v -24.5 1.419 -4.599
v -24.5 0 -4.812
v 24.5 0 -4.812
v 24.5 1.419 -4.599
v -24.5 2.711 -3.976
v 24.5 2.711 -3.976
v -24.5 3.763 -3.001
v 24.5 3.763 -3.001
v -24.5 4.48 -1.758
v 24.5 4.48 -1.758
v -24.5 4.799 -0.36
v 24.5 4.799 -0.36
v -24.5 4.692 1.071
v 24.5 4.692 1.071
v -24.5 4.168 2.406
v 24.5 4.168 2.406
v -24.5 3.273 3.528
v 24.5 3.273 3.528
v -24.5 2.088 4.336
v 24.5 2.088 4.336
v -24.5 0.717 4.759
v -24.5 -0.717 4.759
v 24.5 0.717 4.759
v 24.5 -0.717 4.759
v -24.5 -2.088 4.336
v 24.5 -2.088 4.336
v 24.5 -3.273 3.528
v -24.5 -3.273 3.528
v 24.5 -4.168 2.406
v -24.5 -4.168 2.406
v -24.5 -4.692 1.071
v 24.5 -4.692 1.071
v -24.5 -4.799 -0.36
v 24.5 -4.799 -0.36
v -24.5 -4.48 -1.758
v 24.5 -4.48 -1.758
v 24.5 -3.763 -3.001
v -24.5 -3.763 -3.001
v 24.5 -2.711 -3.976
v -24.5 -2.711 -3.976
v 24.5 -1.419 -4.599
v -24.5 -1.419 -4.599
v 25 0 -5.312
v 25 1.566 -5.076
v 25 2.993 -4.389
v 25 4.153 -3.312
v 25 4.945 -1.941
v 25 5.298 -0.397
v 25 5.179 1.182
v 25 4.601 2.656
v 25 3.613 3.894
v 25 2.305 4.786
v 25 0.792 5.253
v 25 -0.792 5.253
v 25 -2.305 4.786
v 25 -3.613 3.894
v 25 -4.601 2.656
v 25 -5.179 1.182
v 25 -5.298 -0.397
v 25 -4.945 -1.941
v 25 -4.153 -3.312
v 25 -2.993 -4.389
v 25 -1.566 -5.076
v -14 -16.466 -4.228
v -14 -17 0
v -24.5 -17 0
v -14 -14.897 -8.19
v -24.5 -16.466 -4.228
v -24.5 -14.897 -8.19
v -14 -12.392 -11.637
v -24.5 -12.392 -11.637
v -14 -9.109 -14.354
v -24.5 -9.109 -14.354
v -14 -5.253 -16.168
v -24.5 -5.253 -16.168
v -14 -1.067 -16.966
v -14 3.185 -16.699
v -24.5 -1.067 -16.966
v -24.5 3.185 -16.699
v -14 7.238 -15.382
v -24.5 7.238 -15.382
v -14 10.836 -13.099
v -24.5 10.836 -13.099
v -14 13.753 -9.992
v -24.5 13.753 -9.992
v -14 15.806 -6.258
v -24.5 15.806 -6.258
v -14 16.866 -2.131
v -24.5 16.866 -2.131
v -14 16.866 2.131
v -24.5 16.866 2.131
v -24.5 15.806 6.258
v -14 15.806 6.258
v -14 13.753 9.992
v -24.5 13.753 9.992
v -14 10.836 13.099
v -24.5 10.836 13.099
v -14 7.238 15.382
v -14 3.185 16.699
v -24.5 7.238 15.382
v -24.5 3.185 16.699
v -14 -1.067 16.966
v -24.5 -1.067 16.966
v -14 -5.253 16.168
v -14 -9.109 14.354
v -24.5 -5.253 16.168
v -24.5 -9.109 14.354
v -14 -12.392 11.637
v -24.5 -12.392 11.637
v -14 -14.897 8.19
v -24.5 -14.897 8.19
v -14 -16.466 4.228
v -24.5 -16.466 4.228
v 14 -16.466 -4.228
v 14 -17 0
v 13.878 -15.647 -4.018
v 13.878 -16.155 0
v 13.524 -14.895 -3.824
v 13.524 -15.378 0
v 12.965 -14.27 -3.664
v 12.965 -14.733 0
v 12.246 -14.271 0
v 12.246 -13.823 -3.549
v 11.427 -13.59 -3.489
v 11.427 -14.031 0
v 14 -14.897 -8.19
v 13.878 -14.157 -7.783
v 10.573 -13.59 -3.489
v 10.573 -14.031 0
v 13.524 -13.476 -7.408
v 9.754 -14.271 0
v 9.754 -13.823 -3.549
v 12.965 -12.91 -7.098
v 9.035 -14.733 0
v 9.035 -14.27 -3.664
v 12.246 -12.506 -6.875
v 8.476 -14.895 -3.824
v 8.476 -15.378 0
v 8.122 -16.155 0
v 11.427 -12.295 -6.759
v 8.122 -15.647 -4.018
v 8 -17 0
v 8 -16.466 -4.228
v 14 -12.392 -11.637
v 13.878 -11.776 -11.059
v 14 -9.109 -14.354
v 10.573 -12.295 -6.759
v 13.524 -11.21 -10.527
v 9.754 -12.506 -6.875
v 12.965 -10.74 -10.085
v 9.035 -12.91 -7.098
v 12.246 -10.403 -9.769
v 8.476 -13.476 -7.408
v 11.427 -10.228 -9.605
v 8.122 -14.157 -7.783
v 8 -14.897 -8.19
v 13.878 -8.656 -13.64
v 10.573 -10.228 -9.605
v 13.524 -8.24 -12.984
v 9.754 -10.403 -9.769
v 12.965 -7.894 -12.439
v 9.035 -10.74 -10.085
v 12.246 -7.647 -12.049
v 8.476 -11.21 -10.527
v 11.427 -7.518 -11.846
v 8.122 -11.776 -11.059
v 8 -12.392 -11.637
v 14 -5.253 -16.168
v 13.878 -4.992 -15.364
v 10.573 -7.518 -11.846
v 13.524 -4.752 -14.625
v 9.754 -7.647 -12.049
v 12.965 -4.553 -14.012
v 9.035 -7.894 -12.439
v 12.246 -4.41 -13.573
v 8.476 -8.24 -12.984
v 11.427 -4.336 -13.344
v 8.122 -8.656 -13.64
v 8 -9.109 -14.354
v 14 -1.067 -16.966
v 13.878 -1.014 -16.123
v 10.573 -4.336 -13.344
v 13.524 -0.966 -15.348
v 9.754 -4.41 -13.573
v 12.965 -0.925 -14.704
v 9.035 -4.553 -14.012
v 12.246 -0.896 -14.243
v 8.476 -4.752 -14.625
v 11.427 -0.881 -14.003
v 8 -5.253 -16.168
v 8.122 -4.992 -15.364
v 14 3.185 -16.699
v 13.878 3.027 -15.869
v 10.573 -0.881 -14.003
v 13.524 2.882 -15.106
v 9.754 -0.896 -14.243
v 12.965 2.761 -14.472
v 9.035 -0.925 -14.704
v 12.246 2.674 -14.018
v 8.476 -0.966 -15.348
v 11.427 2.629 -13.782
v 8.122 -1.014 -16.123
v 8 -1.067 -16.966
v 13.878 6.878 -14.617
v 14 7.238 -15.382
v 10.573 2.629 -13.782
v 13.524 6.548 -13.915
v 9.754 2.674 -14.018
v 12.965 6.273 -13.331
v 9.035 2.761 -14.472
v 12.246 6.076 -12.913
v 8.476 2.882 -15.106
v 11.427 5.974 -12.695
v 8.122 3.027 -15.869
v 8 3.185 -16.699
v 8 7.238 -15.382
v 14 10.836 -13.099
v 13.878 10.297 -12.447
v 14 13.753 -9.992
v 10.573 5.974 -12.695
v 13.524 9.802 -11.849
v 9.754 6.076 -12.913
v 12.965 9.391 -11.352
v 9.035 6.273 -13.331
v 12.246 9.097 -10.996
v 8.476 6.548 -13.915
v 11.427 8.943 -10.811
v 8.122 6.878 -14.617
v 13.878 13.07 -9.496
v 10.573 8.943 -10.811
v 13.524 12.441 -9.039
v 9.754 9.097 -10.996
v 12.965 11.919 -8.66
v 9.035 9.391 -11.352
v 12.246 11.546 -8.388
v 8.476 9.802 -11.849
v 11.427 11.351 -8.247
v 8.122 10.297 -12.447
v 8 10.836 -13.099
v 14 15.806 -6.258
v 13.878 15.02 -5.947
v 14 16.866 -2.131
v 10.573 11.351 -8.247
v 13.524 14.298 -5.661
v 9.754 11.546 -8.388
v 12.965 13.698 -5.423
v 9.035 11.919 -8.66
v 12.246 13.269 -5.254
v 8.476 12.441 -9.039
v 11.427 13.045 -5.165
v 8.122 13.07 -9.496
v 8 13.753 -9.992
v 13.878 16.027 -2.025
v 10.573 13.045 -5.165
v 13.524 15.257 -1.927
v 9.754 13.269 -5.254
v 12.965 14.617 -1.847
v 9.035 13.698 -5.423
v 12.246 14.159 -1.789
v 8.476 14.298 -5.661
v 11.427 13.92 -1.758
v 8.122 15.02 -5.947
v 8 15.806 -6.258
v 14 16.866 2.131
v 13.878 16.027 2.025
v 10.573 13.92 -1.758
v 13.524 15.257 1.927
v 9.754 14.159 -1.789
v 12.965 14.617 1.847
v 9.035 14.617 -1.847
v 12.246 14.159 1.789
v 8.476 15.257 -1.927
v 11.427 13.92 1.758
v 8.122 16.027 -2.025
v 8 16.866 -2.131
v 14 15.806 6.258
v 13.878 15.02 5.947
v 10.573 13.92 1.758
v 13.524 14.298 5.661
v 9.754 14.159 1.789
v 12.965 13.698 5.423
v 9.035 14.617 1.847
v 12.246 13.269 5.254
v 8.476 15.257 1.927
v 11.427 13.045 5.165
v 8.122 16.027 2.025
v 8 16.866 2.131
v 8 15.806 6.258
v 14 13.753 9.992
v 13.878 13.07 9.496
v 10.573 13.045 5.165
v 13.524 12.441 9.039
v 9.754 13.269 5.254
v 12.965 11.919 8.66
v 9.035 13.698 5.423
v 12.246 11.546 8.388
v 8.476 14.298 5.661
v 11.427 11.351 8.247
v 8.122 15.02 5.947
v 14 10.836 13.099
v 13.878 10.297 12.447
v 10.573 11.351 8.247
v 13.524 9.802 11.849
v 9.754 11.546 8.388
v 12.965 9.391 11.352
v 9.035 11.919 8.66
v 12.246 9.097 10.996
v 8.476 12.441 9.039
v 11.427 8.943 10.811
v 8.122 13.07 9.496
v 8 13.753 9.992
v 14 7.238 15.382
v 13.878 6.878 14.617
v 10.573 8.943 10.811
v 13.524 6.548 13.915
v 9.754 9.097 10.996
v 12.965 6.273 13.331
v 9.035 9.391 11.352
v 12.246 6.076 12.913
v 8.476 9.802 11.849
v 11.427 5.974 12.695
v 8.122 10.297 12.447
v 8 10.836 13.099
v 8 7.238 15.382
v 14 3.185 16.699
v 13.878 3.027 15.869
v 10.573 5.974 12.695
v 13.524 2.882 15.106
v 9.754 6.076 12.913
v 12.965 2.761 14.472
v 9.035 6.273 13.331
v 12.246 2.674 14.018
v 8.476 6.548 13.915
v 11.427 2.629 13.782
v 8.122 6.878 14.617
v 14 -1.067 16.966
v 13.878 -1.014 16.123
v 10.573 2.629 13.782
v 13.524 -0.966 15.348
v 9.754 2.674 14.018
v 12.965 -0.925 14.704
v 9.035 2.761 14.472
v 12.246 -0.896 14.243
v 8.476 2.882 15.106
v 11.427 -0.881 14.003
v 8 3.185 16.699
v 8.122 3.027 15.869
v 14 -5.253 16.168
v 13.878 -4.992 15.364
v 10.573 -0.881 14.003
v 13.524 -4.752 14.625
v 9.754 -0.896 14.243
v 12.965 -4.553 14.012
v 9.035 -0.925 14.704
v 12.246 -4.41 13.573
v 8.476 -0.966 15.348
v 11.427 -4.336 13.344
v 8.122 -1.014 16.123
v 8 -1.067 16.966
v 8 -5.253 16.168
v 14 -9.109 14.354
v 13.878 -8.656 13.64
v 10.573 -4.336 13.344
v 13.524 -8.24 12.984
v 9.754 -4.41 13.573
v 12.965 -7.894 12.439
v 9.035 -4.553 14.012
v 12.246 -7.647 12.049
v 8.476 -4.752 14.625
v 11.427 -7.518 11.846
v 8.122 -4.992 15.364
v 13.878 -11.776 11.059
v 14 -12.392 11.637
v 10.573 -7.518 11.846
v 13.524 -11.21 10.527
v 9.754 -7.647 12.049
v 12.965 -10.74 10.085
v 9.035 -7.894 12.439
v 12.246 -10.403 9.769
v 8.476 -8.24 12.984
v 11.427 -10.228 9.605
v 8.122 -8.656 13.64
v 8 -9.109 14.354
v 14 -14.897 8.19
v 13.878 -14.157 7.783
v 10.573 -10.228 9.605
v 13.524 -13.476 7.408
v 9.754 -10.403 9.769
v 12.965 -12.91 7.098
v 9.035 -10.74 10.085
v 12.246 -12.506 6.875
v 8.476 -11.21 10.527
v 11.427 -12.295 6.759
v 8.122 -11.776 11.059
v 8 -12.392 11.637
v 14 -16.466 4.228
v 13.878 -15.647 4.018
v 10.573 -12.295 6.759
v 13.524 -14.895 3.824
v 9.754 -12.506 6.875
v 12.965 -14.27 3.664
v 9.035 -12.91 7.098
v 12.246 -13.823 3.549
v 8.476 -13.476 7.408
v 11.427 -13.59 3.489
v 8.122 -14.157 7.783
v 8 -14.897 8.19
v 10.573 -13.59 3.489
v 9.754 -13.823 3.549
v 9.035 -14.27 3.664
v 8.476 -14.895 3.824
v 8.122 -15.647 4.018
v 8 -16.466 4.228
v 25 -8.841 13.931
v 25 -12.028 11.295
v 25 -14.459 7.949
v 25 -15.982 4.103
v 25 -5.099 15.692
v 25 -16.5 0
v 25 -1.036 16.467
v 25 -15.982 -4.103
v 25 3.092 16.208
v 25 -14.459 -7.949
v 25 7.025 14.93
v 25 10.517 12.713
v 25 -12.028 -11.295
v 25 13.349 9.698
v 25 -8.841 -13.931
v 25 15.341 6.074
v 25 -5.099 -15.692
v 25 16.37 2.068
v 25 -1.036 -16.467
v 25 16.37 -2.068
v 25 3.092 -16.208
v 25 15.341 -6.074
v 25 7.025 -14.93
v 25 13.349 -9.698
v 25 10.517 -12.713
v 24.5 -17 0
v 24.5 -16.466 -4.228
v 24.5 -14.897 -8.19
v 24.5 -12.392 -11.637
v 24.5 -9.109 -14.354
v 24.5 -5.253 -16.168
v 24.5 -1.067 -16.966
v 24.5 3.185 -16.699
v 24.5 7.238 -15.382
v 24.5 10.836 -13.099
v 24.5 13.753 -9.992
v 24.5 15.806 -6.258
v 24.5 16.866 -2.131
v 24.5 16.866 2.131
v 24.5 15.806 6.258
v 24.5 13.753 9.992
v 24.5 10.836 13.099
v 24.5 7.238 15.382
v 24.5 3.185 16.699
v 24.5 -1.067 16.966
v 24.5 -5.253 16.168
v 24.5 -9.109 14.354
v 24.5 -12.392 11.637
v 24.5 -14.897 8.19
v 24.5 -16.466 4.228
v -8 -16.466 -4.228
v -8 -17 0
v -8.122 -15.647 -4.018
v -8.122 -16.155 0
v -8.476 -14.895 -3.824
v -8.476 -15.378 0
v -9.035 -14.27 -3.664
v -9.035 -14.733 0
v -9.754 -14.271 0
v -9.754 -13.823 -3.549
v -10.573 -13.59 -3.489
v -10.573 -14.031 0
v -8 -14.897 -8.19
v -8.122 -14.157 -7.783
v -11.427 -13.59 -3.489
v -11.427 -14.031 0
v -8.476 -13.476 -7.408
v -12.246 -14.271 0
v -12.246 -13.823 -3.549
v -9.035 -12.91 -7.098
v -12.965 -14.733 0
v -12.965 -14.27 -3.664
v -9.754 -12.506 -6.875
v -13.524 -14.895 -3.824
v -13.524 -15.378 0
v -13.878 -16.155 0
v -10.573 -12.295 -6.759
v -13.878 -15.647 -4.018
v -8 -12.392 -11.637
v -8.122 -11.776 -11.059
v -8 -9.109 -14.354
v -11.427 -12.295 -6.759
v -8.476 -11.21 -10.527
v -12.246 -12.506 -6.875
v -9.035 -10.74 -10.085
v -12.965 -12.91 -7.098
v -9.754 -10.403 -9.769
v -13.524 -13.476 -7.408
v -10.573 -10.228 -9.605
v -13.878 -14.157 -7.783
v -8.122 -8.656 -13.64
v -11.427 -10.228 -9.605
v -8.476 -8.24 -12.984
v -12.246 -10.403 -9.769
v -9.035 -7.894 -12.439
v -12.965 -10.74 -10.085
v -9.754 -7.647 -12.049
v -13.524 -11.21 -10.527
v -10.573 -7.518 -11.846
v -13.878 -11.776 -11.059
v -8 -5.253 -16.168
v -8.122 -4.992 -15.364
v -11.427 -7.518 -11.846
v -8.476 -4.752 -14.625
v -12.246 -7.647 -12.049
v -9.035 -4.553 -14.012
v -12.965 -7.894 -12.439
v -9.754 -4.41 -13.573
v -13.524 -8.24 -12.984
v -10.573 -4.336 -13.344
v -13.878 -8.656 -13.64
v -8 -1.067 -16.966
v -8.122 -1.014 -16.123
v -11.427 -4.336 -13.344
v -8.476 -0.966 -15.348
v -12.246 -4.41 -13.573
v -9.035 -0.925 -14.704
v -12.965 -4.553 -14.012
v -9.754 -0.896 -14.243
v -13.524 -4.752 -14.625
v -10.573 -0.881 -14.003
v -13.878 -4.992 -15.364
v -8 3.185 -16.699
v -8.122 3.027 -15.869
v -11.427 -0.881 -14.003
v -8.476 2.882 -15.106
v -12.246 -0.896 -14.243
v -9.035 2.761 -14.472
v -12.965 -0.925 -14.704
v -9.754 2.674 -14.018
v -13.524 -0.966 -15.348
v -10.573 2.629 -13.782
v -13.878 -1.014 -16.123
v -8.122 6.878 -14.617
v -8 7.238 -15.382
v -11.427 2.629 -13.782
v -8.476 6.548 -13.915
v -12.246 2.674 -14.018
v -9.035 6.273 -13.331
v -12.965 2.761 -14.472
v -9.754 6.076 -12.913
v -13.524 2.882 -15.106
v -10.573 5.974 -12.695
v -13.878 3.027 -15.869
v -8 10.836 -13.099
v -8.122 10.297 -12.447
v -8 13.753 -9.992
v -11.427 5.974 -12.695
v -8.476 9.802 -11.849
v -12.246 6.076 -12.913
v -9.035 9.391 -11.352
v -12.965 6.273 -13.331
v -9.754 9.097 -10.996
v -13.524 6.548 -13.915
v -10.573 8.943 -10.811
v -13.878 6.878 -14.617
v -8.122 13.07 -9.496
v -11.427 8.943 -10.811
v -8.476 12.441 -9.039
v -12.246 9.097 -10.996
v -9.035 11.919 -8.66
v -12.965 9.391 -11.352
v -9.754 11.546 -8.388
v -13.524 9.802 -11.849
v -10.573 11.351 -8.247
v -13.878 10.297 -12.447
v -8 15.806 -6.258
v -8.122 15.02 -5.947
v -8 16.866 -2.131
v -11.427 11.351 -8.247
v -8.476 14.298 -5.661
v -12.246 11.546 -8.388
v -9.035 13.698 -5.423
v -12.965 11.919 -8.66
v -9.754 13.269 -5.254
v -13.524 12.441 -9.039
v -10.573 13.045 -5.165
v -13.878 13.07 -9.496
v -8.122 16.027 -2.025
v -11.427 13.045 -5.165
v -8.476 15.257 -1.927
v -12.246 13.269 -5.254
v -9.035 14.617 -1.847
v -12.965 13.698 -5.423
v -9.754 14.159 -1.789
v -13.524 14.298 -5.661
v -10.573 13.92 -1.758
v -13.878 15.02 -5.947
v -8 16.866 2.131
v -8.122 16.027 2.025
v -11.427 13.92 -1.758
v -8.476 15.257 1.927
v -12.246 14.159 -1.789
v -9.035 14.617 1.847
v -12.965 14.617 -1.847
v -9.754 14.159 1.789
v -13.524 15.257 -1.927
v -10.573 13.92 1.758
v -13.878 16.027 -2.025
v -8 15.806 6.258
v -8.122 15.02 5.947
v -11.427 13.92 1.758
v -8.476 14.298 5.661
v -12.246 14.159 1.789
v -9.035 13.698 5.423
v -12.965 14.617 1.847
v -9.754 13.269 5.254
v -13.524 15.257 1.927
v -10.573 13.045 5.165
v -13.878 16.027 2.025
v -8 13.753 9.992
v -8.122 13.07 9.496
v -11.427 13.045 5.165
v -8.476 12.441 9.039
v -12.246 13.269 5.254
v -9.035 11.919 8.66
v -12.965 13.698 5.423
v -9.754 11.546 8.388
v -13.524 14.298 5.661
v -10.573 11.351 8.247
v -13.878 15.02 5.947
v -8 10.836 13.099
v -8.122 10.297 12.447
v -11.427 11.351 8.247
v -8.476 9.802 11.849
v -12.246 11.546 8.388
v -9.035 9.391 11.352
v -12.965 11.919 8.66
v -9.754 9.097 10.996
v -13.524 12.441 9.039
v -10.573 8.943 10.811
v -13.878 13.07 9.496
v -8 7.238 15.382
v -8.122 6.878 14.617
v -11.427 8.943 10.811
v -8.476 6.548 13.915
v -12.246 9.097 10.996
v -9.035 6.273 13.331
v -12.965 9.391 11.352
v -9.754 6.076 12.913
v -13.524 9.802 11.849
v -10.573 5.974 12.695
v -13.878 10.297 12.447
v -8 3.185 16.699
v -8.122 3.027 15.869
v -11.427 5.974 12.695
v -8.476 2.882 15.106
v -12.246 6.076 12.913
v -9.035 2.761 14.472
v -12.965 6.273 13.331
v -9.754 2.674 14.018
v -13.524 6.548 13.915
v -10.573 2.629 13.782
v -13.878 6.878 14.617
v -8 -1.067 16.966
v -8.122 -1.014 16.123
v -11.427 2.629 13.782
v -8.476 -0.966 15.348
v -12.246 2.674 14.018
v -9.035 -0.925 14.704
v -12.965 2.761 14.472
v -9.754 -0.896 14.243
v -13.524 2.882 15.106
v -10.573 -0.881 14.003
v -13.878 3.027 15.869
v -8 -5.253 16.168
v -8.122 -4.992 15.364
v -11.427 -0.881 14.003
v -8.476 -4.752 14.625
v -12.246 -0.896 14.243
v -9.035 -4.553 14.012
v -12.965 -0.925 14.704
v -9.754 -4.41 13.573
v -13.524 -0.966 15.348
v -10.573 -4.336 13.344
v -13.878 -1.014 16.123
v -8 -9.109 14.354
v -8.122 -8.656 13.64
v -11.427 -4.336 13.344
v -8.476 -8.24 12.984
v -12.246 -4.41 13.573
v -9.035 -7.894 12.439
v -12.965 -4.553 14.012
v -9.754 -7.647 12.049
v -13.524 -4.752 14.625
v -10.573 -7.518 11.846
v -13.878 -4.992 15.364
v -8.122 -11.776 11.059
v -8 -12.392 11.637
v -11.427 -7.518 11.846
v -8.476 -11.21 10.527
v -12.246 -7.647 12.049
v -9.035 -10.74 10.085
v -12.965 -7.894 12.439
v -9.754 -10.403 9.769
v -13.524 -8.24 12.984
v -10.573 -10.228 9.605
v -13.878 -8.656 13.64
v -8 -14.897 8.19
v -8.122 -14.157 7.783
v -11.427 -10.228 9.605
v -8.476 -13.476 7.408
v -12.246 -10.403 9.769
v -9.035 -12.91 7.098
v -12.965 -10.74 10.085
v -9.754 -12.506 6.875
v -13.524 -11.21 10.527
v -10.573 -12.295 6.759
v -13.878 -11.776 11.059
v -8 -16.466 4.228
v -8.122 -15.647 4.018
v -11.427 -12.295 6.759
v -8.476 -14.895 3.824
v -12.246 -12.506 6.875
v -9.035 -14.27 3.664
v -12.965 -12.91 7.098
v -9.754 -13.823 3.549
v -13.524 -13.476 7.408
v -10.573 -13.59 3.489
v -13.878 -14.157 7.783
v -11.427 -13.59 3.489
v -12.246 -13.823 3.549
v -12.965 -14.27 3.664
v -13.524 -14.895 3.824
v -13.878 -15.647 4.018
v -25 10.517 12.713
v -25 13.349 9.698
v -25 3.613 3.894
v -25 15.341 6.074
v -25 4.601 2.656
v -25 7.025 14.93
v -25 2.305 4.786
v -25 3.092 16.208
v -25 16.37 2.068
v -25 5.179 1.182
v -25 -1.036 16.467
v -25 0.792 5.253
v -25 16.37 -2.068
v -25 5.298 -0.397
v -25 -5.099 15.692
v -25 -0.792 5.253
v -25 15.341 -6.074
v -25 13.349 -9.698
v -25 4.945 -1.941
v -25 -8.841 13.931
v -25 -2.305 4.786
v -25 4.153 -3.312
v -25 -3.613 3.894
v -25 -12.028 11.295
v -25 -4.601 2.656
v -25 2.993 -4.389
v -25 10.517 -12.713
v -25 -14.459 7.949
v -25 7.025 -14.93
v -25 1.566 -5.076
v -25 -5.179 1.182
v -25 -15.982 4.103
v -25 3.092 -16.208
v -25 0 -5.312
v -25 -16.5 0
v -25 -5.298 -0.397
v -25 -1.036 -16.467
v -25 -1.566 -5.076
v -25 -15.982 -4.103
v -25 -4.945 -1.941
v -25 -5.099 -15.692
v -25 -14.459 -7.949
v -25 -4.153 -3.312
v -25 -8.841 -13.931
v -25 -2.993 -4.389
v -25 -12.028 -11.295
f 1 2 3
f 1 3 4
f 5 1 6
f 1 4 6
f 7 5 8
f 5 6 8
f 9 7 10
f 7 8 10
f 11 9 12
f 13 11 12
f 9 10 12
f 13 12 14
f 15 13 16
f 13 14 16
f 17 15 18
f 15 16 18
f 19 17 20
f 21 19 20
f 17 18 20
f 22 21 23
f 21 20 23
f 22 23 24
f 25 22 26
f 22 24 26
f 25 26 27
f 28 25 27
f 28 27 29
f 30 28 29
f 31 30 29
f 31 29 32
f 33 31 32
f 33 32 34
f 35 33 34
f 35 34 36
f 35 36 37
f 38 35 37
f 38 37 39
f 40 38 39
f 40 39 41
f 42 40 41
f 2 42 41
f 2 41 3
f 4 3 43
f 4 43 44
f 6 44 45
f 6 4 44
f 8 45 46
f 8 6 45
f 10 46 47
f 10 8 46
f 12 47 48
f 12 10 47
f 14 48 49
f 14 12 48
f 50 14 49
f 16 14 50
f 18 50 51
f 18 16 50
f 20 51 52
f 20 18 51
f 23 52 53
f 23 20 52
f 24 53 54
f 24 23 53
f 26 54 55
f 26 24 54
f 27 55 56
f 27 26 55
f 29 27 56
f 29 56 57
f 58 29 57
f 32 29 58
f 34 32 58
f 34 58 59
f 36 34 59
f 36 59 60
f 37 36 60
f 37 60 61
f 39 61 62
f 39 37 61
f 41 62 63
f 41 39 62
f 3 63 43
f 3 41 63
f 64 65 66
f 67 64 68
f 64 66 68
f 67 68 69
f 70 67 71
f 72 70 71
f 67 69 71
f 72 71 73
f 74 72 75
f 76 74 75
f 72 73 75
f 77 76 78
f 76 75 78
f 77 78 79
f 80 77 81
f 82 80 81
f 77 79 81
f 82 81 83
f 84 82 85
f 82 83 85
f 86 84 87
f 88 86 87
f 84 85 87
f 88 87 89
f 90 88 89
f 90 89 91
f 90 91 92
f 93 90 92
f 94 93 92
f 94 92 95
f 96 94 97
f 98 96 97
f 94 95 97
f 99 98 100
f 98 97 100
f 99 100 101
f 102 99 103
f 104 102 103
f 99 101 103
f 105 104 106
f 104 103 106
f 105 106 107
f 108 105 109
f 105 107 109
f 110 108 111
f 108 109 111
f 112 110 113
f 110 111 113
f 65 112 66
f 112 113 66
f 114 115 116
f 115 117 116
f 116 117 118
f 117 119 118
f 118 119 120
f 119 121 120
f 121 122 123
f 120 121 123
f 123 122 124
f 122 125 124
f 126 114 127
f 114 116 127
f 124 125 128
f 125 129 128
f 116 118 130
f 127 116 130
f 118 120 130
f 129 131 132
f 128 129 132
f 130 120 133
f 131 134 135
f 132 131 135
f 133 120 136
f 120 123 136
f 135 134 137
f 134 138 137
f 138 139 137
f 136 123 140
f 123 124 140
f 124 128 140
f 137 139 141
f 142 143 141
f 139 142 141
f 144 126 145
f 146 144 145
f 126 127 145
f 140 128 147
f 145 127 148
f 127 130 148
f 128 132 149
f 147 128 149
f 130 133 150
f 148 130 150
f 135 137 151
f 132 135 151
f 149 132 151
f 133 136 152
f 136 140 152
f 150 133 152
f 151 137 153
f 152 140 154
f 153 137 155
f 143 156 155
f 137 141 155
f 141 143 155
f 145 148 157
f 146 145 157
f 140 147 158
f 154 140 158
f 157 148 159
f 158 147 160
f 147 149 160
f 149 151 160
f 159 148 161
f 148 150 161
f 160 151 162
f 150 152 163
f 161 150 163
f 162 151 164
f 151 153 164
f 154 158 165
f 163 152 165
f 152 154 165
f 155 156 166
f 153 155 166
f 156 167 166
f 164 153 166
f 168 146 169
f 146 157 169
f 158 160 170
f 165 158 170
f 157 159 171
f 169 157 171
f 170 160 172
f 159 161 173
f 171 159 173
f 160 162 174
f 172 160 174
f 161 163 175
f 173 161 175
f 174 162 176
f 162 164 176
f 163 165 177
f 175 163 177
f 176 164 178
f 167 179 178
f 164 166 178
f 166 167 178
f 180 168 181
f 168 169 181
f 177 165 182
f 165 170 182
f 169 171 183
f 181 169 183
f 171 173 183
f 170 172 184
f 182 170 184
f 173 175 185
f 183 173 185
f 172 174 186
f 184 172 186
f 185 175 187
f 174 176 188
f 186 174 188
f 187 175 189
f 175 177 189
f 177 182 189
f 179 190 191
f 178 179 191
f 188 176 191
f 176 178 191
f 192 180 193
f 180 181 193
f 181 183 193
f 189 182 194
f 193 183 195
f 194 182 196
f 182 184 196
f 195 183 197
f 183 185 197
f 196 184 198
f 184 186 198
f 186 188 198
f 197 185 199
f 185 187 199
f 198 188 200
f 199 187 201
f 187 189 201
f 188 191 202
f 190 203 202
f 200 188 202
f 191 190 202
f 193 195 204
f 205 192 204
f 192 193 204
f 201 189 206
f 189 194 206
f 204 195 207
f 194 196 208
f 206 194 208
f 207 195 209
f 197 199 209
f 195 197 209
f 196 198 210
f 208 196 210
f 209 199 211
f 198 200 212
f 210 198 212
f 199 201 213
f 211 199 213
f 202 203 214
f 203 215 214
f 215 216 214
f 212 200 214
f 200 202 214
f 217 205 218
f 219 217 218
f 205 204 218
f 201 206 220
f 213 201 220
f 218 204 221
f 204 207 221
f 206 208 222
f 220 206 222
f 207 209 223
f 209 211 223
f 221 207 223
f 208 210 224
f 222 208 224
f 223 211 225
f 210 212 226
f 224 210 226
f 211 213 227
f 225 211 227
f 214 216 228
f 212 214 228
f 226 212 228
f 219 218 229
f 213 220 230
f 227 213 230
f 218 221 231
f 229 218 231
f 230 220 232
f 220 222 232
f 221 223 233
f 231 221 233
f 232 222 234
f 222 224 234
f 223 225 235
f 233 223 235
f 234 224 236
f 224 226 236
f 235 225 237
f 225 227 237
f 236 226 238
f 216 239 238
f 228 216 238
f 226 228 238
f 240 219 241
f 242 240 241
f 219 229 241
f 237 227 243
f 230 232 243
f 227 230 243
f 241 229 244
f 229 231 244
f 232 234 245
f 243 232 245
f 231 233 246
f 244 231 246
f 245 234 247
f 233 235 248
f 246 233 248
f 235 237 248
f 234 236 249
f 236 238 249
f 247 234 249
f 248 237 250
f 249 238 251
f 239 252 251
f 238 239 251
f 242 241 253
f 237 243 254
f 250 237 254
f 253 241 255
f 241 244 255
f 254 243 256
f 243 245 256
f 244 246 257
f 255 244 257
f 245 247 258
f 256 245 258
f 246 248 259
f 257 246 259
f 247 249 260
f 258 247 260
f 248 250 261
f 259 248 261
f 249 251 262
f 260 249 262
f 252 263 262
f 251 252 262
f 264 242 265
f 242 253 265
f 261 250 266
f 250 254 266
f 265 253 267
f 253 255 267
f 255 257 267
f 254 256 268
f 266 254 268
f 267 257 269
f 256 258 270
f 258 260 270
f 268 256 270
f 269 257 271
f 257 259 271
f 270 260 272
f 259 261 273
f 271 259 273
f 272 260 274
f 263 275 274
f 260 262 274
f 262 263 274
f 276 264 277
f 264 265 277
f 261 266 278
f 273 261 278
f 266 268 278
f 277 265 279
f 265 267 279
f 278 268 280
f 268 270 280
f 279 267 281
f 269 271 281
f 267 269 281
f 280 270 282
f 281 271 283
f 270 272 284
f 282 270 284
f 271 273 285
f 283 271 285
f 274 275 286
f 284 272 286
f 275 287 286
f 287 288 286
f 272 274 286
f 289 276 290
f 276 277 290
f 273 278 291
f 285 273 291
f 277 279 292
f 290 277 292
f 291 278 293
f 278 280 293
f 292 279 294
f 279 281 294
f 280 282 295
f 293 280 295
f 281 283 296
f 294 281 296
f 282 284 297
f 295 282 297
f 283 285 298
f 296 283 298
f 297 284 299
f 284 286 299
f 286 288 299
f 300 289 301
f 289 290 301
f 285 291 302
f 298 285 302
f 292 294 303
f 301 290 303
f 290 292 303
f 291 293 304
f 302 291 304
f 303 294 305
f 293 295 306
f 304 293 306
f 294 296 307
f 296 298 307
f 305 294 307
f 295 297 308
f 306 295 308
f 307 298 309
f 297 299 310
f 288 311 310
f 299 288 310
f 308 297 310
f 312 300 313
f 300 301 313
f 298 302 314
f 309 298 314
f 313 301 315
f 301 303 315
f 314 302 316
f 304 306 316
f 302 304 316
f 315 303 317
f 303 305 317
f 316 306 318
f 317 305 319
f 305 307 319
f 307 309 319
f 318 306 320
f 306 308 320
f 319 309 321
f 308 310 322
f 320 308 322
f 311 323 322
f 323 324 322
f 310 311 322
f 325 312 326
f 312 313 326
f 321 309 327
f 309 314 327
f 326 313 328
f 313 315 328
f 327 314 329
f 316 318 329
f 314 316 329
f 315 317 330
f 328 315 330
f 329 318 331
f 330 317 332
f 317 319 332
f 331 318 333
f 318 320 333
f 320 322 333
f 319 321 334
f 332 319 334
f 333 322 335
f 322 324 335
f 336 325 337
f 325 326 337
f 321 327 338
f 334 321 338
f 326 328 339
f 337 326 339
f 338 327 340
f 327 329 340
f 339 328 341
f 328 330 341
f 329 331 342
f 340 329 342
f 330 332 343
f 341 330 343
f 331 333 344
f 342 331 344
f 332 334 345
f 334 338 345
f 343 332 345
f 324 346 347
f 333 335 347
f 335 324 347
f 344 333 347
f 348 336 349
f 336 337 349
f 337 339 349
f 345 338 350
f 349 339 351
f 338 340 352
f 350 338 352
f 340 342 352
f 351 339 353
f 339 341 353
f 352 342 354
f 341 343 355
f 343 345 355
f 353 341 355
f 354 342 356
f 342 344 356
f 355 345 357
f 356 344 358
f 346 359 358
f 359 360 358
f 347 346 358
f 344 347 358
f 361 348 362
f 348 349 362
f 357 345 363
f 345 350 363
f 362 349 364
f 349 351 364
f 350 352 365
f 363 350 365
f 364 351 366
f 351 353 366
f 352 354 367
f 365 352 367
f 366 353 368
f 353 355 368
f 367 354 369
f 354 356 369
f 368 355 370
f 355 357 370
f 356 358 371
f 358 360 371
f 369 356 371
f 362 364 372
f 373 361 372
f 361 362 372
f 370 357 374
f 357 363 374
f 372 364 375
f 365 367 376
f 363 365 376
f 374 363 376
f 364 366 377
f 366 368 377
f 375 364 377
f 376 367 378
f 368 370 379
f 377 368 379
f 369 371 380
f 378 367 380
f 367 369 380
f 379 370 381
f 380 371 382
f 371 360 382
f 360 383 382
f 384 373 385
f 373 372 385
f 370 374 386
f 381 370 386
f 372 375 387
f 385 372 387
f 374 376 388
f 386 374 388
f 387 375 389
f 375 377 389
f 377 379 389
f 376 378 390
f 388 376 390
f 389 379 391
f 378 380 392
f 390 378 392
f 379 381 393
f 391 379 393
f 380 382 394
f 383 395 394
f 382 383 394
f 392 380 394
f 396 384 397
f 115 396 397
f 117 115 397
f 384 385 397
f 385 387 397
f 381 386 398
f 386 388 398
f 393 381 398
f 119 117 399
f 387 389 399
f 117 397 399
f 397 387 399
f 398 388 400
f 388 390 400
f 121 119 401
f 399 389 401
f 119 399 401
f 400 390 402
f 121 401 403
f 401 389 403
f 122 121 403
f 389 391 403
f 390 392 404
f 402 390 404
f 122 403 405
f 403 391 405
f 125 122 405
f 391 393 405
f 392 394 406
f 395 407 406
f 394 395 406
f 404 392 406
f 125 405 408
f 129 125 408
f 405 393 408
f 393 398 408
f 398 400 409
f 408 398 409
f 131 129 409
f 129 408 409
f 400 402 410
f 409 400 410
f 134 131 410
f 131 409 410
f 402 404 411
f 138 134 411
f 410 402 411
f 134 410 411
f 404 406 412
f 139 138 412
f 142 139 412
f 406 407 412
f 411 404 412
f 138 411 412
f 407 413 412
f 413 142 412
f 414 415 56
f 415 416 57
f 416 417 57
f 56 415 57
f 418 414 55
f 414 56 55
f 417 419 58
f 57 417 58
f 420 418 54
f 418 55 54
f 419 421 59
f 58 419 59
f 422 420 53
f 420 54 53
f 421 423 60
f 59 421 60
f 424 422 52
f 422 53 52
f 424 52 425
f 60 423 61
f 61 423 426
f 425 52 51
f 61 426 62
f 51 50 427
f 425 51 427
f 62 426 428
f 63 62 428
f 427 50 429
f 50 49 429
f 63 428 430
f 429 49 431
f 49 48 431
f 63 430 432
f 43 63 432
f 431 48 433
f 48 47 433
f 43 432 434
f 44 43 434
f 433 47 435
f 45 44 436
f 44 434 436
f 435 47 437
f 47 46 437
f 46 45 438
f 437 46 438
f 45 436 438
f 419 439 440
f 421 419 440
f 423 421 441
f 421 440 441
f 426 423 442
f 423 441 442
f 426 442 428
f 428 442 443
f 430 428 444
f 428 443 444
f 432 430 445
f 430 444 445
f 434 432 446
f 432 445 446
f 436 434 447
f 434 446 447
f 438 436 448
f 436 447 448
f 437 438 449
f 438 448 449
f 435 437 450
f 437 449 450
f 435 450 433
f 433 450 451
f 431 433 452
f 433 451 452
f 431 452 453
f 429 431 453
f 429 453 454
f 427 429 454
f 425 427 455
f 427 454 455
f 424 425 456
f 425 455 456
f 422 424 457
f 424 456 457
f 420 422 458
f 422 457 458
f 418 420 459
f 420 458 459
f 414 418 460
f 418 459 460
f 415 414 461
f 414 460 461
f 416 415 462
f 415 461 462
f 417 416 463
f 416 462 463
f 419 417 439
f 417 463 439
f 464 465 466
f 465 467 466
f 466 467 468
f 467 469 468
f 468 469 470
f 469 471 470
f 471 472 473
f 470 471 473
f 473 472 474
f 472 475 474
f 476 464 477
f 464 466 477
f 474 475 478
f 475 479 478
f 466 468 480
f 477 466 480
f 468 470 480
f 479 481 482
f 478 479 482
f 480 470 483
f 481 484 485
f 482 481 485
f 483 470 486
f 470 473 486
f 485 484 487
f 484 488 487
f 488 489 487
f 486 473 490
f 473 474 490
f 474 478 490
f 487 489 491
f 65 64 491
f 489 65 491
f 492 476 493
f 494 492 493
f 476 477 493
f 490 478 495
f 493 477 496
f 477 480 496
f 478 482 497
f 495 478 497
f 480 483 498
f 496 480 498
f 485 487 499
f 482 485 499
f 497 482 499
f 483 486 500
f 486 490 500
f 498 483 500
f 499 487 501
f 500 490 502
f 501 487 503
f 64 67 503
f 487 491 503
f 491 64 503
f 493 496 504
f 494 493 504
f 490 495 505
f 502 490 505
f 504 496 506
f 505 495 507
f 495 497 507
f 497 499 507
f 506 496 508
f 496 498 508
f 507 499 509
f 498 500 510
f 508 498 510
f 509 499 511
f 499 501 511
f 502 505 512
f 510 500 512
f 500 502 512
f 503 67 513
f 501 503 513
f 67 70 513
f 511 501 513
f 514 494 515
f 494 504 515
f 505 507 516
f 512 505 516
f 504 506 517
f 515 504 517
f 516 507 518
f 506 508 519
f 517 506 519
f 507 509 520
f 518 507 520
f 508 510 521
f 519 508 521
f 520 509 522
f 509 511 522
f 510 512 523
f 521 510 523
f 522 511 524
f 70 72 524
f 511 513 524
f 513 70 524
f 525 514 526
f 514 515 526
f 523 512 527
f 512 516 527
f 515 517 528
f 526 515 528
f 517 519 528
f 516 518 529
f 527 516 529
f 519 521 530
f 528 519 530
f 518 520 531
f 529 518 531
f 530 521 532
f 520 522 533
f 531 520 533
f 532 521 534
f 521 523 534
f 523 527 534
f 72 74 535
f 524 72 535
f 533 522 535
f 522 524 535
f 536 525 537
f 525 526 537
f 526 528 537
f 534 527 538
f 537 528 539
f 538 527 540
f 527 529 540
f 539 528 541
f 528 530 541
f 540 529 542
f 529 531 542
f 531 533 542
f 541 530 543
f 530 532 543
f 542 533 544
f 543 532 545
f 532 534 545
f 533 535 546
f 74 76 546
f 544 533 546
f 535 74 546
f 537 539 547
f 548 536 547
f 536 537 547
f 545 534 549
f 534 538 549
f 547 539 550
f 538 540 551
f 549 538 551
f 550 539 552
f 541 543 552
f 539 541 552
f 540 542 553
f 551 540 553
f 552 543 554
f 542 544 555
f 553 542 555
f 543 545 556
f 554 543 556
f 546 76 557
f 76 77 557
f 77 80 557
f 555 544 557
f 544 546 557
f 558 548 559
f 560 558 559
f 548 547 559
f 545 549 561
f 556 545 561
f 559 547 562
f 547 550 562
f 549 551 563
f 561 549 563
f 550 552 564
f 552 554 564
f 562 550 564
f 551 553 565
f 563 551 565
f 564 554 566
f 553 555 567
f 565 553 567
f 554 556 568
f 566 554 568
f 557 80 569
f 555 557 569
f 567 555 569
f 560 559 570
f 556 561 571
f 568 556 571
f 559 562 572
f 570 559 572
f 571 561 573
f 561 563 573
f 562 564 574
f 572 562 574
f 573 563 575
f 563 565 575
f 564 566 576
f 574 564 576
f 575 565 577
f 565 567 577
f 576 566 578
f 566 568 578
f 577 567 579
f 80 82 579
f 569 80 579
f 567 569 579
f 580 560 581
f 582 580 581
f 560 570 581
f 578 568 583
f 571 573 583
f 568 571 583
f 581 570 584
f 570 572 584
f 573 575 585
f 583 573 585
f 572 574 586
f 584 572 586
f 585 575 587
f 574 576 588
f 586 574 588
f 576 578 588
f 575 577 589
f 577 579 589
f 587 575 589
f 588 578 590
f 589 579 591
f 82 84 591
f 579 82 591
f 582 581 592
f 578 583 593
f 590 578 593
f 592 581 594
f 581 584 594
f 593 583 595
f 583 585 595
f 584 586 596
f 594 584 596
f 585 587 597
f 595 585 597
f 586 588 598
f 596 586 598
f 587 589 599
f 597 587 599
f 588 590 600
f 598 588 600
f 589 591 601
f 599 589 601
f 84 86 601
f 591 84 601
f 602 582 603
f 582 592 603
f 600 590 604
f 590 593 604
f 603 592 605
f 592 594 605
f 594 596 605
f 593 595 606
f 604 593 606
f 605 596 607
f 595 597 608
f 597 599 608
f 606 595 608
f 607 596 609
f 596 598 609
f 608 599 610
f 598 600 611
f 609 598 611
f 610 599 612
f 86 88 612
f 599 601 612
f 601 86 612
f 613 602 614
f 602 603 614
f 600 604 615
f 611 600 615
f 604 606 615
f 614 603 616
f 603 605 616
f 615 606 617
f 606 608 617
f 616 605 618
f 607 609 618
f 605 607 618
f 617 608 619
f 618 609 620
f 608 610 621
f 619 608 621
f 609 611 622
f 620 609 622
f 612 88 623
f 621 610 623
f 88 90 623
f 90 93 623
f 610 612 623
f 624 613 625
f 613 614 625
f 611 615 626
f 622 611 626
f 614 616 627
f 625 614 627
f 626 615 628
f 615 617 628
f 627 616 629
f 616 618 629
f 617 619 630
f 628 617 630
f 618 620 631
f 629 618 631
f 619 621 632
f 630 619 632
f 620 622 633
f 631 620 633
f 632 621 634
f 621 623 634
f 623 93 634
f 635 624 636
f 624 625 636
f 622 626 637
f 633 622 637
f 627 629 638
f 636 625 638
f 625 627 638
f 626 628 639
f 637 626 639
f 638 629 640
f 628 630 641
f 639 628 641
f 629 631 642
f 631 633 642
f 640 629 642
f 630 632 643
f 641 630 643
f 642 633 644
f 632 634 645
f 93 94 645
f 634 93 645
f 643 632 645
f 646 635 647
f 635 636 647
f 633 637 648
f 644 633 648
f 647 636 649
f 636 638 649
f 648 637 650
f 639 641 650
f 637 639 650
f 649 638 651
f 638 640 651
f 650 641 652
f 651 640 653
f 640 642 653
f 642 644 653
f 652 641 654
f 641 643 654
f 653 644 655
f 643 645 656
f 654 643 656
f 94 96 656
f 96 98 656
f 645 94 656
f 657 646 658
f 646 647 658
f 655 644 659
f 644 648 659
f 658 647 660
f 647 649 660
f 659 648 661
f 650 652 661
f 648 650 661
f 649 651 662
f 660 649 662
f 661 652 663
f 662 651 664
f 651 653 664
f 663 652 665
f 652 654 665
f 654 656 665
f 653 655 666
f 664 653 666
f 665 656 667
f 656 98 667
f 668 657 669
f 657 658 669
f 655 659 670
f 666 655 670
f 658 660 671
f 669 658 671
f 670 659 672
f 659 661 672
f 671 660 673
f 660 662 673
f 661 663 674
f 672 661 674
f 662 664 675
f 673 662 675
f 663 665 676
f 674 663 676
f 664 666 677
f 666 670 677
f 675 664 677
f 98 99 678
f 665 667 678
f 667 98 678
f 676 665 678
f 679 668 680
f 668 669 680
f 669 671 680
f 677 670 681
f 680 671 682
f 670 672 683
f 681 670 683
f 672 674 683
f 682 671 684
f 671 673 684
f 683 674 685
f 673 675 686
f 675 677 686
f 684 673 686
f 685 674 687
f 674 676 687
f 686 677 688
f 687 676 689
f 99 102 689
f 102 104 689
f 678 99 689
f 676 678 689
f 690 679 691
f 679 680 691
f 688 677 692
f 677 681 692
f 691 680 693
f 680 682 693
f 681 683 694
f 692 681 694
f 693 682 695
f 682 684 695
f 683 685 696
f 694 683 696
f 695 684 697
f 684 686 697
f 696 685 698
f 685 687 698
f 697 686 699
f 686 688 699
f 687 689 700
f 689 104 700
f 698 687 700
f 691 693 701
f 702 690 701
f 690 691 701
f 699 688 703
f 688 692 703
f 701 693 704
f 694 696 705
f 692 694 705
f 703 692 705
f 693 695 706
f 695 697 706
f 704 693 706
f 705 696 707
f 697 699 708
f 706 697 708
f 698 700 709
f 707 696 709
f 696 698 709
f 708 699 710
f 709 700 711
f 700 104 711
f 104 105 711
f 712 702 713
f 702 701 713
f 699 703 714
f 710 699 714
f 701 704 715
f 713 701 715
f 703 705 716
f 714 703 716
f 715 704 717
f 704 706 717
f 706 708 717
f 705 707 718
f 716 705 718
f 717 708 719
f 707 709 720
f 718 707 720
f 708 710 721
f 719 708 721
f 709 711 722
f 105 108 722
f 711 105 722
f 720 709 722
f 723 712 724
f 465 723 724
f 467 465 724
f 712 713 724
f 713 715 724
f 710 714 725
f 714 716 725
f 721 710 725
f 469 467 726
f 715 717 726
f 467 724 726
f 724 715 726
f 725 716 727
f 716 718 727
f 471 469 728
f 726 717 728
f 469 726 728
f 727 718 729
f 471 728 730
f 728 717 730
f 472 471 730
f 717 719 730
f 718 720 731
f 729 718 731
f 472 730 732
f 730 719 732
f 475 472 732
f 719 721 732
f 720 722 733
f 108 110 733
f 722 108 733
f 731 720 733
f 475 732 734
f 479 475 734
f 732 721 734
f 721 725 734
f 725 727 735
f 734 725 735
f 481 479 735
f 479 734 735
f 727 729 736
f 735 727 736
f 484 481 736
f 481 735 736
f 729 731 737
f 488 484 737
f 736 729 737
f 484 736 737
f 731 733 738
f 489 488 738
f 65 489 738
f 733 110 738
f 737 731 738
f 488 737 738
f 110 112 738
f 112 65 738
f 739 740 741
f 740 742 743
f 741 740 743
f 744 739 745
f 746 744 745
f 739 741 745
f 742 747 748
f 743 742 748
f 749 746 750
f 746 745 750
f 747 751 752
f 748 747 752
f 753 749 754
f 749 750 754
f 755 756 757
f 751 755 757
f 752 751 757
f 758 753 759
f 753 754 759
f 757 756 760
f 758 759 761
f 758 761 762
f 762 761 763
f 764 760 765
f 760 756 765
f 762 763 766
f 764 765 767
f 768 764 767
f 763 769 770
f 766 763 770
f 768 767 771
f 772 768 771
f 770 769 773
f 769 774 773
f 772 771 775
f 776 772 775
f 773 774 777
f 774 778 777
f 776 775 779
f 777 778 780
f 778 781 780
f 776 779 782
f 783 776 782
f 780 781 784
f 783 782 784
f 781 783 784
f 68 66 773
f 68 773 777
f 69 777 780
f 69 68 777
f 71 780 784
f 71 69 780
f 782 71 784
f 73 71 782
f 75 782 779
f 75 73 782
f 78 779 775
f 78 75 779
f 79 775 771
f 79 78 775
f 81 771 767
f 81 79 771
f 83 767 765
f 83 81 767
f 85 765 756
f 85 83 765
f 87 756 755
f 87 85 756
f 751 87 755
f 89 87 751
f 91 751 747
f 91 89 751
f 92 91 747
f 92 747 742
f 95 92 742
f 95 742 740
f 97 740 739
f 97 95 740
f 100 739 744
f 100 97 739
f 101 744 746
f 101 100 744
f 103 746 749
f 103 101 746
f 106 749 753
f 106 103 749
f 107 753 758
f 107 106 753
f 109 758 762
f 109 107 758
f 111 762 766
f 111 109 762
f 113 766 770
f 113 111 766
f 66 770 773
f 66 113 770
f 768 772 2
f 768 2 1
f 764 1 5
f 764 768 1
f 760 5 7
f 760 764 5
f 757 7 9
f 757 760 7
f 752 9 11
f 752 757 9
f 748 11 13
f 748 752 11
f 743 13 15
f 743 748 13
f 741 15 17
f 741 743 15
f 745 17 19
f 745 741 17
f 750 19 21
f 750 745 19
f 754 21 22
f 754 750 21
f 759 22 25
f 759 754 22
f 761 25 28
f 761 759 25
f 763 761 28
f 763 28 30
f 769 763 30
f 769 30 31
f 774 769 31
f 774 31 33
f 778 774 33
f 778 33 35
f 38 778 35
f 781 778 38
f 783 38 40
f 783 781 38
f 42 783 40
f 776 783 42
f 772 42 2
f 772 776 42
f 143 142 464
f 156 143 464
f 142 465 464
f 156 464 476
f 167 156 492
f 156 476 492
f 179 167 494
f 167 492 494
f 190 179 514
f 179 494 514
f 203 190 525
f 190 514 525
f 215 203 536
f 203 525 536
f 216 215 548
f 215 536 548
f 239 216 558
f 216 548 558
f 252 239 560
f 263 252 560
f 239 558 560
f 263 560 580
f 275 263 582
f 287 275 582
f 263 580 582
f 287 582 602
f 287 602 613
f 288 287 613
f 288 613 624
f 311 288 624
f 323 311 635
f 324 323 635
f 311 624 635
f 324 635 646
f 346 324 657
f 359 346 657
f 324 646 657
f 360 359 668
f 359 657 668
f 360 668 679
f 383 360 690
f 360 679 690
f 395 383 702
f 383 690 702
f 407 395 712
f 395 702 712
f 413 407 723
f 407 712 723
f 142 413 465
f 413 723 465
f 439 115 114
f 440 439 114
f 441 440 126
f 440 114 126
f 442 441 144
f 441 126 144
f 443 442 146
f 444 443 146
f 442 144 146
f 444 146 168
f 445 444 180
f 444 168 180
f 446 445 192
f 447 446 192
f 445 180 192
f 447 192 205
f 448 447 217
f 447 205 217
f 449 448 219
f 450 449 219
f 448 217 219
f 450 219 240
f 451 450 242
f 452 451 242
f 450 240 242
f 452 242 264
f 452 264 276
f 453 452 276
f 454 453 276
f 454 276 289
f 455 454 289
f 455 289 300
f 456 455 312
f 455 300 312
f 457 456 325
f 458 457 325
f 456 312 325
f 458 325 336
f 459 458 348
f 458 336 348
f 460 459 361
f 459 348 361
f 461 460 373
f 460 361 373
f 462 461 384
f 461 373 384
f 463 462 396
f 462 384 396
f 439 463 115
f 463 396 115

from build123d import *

# Parameters (mm, degrees)
SKETCH3_R          = 4.8125
CUT_EXTRUDE2_DEPTH = 51
CHAMFER1_SIZE      = 0.5


with BuildPart() as part:
    # Sketch1 → Revolve1 (revolve)
    with BuildSketch(Plane.XY):
        with BuildLine():
            Line((-25, 0), (25, 0))
            Line((25, 0), (25, -17))
            Line((25, -17), (14, -17))
            ThreePointArc((14, -17), (11, -14), (8, -17))
            Line((8, -17), (-8, -17))
            ThreePointArc((-8, -17), (-11, -14), (-14, -17))
            Line((-14, -17), (-25, -17))
            Line((-25, -17), (-25, 0))
        make_face()
    revolve(axis=Axis((-25, 0, 0), (1, 0, 0)))

    # Sketch3 → Cut-Extrude2 (cut, through all)
    with BuildSketch(Plane(origin=(25, 0, 0), x_dir=(0, 0, -1), z_dir=(1, 0, 0))):
        Circle(SKETCH3_R)
    extrude(amount=-CUT_EXTRUDE2_DEPTH, mode=Mode.SUBTRACT)

    # Chamfer1
    chamfer1_edges = [part.edges().sort_by_distance(p)[0] for p in [
        (25, 17, 0),
        (-25, 0, 4.8125),
        (25, 0, 4.8125),
        (-25, 17, 0),
    ]]
    chamfer(chamfer1_edges, length=CHAMFER1_SIZE)


solid = part.part
